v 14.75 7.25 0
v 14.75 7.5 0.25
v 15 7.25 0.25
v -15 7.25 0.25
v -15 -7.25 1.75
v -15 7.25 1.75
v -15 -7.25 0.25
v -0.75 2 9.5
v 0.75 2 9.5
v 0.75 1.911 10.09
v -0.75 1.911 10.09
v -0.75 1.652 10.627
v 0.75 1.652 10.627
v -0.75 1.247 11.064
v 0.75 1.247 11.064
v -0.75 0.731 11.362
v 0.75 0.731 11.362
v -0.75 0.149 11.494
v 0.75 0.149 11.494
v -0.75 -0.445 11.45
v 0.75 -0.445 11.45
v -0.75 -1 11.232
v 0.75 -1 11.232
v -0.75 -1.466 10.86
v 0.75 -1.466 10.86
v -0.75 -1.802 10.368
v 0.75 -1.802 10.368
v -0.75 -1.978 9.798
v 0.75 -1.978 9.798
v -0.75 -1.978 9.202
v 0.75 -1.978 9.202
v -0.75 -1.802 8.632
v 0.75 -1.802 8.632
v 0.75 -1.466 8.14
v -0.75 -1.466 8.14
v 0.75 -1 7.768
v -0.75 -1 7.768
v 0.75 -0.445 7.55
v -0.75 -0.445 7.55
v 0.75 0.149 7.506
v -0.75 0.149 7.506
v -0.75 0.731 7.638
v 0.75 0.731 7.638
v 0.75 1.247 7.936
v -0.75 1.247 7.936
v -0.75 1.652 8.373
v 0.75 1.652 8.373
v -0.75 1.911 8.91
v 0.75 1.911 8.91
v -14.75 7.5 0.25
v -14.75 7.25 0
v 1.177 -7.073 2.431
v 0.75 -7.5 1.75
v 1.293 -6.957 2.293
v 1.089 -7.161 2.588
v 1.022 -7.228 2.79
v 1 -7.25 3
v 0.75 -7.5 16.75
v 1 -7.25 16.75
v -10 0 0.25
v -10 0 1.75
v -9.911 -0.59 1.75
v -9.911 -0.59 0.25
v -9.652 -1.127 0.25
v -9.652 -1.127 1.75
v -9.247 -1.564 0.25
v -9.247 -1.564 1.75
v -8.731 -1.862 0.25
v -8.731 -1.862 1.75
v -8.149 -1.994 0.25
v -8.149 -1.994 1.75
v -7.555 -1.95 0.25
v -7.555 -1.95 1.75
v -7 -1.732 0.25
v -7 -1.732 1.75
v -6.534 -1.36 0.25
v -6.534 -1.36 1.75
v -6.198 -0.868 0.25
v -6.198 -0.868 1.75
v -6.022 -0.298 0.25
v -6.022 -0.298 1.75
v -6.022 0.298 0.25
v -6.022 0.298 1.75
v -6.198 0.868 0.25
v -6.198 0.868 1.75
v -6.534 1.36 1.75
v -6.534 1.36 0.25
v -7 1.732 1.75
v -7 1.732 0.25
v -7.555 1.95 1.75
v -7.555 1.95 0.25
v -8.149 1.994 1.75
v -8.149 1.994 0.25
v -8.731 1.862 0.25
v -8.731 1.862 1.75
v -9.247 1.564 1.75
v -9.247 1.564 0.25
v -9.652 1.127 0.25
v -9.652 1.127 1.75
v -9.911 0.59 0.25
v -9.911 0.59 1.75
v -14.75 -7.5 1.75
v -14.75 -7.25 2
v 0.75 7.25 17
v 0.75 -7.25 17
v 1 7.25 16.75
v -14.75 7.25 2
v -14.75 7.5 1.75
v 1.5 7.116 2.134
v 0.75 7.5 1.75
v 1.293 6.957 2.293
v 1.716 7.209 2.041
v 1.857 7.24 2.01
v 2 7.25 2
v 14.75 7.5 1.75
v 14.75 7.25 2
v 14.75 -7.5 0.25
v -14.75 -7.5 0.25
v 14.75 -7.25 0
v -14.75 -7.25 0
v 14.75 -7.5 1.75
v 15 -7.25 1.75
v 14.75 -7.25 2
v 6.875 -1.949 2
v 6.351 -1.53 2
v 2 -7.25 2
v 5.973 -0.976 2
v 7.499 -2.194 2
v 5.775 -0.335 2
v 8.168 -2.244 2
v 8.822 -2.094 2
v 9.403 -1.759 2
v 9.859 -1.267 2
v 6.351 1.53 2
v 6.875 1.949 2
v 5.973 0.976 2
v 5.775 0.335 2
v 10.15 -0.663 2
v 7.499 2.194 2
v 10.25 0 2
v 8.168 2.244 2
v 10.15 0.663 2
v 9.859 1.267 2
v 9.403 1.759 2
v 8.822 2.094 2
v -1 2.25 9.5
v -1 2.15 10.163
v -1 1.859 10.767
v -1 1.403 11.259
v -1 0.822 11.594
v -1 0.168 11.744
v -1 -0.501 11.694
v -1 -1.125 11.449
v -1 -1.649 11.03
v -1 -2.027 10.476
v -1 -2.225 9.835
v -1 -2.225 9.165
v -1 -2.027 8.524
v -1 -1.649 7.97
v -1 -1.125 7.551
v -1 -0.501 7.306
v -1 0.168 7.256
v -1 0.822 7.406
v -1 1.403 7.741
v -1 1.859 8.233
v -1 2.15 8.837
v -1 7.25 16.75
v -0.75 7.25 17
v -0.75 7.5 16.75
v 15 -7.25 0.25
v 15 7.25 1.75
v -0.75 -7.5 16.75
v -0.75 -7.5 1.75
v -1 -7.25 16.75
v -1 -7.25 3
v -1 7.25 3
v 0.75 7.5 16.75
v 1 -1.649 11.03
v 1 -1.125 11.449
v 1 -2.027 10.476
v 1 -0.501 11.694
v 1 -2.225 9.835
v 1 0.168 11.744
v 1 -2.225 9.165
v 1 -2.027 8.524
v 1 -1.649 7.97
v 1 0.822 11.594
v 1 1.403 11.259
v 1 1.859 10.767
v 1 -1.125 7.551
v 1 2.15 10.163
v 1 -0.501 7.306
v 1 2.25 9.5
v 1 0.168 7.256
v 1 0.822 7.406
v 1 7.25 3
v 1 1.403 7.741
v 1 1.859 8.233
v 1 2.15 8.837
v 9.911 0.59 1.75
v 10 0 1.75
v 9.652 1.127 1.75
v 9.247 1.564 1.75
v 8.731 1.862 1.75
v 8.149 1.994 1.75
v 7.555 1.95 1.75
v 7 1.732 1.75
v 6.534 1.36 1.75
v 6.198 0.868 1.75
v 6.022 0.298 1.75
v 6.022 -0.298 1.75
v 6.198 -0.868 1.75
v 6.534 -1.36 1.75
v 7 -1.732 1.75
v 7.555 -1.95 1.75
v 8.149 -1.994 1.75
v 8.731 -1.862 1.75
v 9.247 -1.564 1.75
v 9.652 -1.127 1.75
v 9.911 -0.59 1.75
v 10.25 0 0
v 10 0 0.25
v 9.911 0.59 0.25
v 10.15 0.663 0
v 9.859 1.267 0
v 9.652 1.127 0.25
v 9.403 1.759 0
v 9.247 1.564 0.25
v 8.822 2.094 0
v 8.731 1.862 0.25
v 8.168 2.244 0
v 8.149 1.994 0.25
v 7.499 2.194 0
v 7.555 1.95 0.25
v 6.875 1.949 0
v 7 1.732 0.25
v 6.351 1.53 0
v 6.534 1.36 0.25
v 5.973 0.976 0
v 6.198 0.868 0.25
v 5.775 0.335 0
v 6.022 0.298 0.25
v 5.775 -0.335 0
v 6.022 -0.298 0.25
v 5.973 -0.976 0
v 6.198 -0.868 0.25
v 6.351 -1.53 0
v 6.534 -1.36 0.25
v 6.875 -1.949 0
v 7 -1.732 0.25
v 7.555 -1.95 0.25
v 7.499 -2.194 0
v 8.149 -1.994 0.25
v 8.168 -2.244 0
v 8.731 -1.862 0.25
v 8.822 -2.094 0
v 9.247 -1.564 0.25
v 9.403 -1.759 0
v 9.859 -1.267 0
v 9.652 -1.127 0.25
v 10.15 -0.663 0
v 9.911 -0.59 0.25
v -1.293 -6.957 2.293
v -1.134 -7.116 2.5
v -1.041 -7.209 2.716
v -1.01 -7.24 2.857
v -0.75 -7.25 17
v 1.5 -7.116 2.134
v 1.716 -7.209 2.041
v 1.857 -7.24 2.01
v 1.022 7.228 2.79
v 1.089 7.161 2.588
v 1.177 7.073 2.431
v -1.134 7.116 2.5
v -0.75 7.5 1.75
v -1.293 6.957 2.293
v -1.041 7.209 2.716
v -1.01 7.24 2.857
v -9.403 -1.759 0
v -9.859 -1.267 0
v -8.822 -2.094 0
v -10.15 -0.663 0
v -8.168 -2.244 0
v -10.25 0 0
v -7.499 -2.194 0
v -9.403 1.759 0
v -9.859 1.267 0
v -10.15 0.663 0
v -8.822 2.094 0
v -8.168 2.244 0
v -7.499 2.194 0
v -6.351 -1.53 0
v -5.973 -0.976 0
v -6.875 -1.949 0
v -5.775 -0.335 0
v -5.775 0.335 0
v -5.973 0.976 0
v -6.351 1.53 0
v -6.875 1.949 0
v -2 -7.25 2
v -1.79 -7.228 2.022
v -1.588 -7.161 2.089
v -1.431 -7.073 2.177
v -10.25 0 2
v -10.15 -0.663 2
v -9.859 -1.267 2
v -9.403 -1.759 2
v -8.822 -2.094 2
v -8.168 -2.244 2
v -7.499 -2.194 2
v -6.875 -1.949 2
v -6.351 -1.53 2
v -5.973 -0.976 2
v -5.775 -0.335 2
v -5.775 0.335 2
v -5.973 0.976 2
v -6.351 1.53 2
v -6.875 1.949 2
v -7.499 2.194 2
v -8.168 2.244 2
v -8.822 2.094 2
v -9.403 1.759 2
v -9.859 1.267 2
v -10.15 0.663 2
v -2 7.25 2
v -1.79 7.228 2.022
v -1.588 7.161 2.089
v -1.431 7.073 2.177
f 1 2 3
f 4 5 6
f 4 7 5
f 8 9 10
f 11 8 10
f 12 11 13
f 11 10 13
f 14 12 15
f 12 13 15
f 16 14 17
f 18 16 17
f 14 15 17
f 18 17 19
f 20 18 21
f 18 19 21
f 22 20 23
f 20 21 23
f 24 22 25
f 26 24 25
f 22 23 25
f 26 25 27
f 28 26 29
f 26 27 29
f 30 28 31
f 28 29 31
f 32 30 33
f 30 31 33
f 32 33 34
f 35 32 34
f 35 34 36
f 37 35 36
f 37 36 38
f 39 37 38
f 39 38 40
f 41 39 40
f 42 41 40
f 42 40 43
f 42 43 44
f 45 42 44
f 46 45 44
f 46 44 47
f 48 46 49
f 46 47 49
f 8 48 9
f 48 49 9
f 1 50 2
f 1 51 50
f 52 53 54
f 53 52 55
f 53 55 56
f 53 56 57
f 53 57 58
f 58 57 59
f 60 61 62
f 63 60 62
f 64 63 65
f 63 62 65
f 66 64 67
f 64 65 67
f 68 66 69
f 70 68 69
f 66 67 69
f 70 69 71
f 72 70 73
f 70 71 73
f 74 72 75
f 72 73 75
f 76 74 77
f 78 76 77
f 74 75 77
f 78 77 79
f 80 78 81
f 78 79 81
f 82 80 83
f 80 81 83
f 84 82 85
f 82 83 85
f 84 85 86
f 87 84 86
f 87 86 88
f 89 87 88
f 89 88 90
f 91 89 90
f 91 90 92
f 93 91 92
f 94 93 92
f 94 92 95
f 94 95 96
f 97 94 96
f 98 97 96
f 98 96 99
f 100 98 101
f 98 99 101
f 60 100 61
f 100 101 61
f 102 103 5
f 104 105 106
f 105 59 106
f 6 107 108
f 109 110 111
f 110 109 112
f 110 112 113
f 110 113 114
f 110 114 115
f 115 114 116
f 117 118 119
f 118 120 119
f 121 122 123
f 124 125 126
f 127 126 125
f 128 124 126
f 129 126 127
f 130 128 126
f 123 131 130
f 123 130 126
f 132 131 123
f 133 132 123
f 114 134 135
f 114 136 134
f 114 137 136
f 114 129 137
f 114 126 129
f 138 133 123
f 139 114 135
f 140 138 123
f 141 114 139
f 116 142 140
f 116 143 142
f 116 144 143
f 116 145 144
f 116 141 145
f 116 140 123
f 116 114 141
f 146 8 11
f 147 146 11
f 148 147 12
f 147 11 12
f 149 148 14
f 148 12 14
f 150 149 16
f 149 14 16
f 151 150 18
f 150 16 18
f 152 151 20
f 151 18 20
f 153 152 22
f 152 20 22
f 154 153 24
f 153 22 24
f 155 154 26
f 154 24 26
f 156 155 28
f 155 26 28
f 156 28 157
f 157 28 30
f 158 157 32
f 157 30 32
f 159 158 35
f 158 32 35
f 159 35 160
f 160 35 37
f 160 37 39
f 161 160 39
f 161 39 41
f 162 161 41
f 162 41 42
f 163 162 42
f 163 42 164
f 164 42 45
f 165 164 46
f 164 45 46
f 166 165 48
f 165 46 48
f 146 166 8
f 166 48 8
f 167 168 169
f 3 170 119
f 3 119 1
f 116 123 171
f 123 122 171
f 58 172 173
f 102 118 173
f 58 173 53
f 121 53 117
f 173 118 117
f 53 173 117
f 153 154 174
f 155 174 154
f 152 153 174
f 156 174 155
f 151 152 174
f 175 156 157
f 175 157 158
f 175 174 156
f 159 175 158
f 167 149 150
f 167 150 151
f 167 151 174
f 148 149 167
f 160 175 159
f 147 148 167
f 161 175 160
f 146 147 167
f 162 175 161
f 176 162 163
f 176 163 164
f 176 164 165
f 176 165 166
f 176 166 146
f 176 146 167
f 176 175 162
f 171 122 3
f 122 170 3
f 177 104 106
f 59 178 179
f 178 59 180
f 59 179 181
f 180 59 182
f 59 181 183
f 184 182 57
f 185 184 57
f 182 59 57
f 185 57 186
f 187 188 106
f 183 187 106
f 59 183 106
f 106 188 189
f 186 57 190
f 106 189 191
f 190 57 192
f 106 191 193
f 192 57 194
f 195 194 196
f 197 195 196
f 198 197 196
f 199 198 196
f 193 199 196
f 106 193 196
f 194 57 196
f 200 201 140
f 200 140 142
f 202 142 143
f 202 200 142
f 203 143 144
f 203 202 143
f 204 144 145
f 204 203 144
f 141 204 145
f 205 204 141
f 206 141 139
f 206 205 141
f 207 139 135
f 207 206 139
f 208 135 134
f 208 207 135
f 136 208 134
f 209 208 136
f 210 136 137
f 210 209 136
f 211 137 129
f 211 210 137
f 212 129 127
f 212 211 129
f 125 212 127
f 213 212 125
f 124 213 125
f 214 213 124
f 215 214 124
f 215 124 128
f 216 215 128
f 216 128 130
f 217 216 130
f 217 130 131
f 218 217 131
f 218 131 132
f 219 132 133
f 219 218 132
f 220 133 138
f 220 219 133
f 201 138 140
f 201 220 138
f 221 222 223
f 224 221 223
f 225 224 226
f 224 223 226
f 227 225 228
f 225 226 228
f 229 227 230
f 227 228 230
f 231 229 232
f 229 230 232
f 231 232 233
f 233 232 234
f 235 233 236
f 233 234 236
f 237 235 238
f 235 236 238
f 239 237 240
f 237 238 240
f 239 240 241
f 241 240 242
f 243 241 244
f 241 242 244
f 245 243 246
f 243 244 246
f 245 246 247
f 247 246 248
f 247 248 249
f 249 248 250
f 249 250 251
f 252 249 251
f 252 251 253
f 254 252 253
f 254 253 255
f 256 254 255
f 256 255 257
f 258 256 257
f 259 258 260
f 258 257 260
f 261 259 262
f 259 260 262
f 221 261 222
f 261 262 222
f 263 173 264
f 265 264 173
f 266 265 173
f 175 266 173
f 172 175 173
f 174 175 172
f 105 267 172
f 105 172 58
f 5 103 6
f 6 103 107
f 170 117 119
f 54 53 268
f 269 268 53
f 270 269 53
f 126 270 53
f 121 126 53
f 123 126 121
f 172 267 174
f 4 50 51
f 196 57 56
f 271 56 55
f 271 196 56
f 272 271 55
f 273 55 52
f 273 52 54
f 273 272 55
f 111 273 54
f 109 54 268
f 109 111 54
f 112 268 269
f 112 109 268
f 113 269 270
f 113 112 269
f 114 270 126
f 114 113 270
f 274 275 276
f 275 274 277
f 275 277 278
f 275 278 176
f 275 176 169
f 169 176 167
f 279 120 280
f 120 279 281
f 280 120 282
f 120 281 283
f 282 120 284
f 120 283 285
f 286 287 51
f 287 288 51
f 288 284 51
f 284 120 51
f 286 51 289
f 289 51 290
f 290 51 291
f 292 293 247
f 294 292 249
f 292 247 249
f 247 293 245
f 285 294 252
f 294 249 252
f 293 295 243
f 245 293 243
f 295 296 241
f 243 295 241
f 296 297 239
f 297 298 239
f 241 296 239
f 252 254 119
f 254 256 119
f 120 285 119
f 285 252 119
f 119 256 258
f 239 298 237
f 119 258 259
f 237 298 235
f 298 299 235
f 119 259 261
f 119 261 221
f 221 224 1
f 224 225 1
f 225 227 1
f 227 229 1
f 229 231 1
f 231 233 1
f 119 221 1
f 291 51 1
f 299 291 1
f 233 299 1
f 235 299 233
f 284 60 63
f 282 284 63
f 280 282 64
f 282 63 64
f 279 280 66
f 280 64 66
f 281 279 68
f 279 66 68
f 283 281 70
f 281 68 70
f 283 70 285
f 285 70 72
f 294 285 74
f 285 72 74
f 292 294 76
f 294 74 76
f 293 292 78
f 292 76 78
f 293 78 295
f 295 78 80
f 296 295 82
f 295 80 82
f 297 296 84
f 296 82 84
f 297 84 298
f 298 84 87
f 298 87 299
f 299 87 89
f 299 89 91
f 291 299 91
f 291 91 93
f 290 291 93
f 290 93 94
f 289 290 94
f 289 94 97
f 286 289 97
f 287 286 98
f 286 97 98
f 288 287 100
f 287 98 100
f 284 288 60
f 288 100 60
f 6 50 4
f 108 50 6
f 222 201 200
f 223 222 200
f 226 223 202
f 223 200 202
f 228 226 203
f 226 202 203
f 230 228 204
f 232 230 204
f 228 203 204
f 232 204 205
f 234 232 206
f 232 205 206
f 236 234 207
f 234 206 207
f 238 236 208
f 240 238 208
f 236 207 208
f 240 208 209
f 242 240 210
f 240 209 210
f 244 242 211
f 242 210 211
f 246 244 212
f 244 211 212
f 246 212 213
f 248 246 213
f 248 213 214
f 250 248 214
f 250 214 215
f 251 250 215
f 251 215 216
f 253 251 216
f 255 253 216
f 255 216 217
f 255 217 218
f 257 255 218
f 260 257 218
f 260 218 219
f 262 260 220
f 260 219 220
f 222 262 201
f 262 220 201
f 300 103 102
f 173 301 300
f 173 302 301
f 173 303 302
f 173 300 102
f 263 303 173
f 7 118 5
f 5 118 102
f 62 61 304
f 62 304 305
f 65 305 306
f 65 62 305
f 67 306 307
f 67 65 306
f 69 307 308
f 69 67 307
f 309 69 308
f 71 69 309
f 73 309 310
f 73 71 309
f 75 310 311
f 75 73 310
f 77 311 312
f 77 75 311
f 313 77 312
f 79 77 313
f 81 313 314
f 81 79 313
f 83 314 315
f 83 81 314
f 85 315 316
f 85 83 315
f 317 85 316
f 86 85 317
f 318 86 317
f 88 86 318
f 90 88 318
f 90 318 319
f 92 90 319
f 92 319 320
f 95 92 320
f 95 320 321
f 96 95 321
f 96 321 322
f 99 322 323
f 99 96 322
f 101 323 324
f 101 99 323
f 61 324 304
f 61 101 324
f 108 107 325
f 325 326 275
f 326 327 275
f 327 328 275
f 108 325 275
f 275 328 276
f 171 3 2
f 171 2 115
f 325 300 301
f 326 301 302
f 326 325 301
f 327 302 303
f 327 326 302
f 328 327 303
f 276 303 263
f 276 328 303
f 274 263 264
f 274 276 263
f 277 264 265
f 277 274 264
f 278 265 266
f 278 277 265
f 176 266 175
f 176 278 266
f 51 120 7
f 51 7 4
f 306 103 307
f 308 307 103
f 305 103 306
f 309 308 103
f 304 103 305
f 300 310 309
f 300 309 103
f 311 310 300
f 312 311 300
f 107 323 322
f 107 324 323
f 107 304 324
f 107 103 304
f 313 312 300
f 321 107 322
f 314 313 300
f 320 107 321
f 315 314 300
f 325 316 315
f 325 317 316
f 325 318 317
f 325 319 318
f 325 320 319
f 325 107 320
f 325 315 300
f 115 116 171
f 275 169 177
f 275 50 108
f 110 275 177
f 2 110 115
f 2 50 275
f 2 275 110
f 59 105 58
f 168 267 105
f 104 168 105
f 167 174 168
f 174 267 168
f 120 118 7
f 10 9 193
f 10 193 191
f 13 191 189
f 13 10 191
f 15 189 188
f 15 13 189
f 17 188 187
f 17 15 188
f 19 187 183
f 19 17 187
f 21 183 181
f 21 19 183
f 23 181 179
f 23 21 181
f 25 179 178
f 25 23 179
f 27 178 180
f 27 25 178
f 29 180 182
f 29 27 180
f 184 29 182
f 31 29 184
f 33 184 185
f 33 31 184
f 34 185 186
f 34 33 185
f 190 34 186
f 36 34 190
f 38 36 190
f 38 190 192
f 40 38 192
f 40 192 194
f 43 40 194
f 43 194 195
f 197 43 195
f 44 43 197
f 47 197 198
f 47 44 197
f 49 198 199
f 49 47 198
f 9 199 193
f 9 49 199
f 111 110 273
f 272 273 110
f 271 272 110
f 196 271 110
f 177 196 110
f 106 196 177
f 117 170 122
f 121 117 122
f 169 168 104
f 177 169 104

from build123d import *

# Parameters (mm, degrees)
SKETCH_W           = 30
SKETCH_H           = 15
PAD_DEPTH          = 2
SKETCH001_W        = 2
SKETCH001_H        = 15
PAD001_DEPTH       = 15
SKETCH002_R        = 2
POCKET_DEPTH       = 2
POLARPATTERN_COUNT = 2
SKETCH003_R        = 2
POCKET001_DEPTH    = 2
CHAMFER_SIZE       = 0.25
FILLET_R           = 1


with BuildPart() as part:
    # Sketch → Pad (new body)
    with BuildSketch(Plane.XY):
        Rectangle(SKETCH_W, SKETCH_H)
    extrude(amount=PAD_DEPTH)

    # Sketch001 (on Face6 of Pad) → Pad001 (join)
    with BuildSketch(Plane.XY.offset(2)):
        Rectangle(SKETCH001_W, SKETCH001_H)
    extrude(amount=PAD001_DEPTH)

    # Sketch002 (on Face5 of Pad001) → Pocket (cut)
    with BuildSketch(Plane.XY.offset(2)):
        with Locations((8, 0)):
            Circle(SKETCH002_R)
    pocket = extrude(amount=-POCKET_DEPTH, mode=Mode.SUBTRACT)

    # PolarPattern: Pocket ×2 about axis
    polarpattern_axis = Axis((0, 0, 2), (0, 0, 1))
    for i in range(1, POLARPATTERN_COUNT):
        add(pocket.rotate(polarpattern_axis, i * 360 / POLARPATTERN_COUNT), mode=Mode.SUBTRACT)

    # Sketch003 (on Face9 of PolarPattern) → Pocket001 (cut)
    with BuildSketch(Plane.YZ.offset(1)):
        with Locations((0, 9.5)):
            Circle(SKETCH003_R)
    extrude(amount=-POCKET001_DEPTH, mode=Mode.SUBTRACT)

    # Chamfer
    chamfer_edges = [part.edges().sort_by_distance(p)[0] for p in [
        (-6, 0, 2),
        (6, 0, 2),
        (-1, -2, 9.5),
        (1, -2, 9.5),
        (-1, 0, 17),
        (1, 0, 17),
        (0, -7.5, 17),
        (0, 7.5, 17),
        (-1, 7.5, 9.5),
        (1, 7.5, 9.5),
        (8, 7.5, 2),
        (-8, 7.5, 2),
        (0, 7.5, 0),
        (-15, 0, 2),
        (15, 0, 2),
        (6, 0, 0),
        (-6, 0, 0),
        (-8, -7.5, 2),
        (-1, -7.5, 9.5),
        (1, -7.5, 9.5),
        (0, -7.5, 0),
        (15, -7.5, 1),
        (8, -7.5, 2),
        (-15, -7.5, 1),
        (-15, 7.5, 1),
        (-15, 0, 0),
        (15, 7.5, 1),
        (15, 0, 0),
    ]]
    chamfer(chamfer_edges, length=CHAMFER_SIZE)

    # Fillet
    fillet_edges = [part.edges().sort_by_distance(p)[0] for p in [
        (1, 0, 2),
        (-1, 0, 2),
    ]]
    fillet(fillet_edges, radius=FILLET_R)


solid = part.part
